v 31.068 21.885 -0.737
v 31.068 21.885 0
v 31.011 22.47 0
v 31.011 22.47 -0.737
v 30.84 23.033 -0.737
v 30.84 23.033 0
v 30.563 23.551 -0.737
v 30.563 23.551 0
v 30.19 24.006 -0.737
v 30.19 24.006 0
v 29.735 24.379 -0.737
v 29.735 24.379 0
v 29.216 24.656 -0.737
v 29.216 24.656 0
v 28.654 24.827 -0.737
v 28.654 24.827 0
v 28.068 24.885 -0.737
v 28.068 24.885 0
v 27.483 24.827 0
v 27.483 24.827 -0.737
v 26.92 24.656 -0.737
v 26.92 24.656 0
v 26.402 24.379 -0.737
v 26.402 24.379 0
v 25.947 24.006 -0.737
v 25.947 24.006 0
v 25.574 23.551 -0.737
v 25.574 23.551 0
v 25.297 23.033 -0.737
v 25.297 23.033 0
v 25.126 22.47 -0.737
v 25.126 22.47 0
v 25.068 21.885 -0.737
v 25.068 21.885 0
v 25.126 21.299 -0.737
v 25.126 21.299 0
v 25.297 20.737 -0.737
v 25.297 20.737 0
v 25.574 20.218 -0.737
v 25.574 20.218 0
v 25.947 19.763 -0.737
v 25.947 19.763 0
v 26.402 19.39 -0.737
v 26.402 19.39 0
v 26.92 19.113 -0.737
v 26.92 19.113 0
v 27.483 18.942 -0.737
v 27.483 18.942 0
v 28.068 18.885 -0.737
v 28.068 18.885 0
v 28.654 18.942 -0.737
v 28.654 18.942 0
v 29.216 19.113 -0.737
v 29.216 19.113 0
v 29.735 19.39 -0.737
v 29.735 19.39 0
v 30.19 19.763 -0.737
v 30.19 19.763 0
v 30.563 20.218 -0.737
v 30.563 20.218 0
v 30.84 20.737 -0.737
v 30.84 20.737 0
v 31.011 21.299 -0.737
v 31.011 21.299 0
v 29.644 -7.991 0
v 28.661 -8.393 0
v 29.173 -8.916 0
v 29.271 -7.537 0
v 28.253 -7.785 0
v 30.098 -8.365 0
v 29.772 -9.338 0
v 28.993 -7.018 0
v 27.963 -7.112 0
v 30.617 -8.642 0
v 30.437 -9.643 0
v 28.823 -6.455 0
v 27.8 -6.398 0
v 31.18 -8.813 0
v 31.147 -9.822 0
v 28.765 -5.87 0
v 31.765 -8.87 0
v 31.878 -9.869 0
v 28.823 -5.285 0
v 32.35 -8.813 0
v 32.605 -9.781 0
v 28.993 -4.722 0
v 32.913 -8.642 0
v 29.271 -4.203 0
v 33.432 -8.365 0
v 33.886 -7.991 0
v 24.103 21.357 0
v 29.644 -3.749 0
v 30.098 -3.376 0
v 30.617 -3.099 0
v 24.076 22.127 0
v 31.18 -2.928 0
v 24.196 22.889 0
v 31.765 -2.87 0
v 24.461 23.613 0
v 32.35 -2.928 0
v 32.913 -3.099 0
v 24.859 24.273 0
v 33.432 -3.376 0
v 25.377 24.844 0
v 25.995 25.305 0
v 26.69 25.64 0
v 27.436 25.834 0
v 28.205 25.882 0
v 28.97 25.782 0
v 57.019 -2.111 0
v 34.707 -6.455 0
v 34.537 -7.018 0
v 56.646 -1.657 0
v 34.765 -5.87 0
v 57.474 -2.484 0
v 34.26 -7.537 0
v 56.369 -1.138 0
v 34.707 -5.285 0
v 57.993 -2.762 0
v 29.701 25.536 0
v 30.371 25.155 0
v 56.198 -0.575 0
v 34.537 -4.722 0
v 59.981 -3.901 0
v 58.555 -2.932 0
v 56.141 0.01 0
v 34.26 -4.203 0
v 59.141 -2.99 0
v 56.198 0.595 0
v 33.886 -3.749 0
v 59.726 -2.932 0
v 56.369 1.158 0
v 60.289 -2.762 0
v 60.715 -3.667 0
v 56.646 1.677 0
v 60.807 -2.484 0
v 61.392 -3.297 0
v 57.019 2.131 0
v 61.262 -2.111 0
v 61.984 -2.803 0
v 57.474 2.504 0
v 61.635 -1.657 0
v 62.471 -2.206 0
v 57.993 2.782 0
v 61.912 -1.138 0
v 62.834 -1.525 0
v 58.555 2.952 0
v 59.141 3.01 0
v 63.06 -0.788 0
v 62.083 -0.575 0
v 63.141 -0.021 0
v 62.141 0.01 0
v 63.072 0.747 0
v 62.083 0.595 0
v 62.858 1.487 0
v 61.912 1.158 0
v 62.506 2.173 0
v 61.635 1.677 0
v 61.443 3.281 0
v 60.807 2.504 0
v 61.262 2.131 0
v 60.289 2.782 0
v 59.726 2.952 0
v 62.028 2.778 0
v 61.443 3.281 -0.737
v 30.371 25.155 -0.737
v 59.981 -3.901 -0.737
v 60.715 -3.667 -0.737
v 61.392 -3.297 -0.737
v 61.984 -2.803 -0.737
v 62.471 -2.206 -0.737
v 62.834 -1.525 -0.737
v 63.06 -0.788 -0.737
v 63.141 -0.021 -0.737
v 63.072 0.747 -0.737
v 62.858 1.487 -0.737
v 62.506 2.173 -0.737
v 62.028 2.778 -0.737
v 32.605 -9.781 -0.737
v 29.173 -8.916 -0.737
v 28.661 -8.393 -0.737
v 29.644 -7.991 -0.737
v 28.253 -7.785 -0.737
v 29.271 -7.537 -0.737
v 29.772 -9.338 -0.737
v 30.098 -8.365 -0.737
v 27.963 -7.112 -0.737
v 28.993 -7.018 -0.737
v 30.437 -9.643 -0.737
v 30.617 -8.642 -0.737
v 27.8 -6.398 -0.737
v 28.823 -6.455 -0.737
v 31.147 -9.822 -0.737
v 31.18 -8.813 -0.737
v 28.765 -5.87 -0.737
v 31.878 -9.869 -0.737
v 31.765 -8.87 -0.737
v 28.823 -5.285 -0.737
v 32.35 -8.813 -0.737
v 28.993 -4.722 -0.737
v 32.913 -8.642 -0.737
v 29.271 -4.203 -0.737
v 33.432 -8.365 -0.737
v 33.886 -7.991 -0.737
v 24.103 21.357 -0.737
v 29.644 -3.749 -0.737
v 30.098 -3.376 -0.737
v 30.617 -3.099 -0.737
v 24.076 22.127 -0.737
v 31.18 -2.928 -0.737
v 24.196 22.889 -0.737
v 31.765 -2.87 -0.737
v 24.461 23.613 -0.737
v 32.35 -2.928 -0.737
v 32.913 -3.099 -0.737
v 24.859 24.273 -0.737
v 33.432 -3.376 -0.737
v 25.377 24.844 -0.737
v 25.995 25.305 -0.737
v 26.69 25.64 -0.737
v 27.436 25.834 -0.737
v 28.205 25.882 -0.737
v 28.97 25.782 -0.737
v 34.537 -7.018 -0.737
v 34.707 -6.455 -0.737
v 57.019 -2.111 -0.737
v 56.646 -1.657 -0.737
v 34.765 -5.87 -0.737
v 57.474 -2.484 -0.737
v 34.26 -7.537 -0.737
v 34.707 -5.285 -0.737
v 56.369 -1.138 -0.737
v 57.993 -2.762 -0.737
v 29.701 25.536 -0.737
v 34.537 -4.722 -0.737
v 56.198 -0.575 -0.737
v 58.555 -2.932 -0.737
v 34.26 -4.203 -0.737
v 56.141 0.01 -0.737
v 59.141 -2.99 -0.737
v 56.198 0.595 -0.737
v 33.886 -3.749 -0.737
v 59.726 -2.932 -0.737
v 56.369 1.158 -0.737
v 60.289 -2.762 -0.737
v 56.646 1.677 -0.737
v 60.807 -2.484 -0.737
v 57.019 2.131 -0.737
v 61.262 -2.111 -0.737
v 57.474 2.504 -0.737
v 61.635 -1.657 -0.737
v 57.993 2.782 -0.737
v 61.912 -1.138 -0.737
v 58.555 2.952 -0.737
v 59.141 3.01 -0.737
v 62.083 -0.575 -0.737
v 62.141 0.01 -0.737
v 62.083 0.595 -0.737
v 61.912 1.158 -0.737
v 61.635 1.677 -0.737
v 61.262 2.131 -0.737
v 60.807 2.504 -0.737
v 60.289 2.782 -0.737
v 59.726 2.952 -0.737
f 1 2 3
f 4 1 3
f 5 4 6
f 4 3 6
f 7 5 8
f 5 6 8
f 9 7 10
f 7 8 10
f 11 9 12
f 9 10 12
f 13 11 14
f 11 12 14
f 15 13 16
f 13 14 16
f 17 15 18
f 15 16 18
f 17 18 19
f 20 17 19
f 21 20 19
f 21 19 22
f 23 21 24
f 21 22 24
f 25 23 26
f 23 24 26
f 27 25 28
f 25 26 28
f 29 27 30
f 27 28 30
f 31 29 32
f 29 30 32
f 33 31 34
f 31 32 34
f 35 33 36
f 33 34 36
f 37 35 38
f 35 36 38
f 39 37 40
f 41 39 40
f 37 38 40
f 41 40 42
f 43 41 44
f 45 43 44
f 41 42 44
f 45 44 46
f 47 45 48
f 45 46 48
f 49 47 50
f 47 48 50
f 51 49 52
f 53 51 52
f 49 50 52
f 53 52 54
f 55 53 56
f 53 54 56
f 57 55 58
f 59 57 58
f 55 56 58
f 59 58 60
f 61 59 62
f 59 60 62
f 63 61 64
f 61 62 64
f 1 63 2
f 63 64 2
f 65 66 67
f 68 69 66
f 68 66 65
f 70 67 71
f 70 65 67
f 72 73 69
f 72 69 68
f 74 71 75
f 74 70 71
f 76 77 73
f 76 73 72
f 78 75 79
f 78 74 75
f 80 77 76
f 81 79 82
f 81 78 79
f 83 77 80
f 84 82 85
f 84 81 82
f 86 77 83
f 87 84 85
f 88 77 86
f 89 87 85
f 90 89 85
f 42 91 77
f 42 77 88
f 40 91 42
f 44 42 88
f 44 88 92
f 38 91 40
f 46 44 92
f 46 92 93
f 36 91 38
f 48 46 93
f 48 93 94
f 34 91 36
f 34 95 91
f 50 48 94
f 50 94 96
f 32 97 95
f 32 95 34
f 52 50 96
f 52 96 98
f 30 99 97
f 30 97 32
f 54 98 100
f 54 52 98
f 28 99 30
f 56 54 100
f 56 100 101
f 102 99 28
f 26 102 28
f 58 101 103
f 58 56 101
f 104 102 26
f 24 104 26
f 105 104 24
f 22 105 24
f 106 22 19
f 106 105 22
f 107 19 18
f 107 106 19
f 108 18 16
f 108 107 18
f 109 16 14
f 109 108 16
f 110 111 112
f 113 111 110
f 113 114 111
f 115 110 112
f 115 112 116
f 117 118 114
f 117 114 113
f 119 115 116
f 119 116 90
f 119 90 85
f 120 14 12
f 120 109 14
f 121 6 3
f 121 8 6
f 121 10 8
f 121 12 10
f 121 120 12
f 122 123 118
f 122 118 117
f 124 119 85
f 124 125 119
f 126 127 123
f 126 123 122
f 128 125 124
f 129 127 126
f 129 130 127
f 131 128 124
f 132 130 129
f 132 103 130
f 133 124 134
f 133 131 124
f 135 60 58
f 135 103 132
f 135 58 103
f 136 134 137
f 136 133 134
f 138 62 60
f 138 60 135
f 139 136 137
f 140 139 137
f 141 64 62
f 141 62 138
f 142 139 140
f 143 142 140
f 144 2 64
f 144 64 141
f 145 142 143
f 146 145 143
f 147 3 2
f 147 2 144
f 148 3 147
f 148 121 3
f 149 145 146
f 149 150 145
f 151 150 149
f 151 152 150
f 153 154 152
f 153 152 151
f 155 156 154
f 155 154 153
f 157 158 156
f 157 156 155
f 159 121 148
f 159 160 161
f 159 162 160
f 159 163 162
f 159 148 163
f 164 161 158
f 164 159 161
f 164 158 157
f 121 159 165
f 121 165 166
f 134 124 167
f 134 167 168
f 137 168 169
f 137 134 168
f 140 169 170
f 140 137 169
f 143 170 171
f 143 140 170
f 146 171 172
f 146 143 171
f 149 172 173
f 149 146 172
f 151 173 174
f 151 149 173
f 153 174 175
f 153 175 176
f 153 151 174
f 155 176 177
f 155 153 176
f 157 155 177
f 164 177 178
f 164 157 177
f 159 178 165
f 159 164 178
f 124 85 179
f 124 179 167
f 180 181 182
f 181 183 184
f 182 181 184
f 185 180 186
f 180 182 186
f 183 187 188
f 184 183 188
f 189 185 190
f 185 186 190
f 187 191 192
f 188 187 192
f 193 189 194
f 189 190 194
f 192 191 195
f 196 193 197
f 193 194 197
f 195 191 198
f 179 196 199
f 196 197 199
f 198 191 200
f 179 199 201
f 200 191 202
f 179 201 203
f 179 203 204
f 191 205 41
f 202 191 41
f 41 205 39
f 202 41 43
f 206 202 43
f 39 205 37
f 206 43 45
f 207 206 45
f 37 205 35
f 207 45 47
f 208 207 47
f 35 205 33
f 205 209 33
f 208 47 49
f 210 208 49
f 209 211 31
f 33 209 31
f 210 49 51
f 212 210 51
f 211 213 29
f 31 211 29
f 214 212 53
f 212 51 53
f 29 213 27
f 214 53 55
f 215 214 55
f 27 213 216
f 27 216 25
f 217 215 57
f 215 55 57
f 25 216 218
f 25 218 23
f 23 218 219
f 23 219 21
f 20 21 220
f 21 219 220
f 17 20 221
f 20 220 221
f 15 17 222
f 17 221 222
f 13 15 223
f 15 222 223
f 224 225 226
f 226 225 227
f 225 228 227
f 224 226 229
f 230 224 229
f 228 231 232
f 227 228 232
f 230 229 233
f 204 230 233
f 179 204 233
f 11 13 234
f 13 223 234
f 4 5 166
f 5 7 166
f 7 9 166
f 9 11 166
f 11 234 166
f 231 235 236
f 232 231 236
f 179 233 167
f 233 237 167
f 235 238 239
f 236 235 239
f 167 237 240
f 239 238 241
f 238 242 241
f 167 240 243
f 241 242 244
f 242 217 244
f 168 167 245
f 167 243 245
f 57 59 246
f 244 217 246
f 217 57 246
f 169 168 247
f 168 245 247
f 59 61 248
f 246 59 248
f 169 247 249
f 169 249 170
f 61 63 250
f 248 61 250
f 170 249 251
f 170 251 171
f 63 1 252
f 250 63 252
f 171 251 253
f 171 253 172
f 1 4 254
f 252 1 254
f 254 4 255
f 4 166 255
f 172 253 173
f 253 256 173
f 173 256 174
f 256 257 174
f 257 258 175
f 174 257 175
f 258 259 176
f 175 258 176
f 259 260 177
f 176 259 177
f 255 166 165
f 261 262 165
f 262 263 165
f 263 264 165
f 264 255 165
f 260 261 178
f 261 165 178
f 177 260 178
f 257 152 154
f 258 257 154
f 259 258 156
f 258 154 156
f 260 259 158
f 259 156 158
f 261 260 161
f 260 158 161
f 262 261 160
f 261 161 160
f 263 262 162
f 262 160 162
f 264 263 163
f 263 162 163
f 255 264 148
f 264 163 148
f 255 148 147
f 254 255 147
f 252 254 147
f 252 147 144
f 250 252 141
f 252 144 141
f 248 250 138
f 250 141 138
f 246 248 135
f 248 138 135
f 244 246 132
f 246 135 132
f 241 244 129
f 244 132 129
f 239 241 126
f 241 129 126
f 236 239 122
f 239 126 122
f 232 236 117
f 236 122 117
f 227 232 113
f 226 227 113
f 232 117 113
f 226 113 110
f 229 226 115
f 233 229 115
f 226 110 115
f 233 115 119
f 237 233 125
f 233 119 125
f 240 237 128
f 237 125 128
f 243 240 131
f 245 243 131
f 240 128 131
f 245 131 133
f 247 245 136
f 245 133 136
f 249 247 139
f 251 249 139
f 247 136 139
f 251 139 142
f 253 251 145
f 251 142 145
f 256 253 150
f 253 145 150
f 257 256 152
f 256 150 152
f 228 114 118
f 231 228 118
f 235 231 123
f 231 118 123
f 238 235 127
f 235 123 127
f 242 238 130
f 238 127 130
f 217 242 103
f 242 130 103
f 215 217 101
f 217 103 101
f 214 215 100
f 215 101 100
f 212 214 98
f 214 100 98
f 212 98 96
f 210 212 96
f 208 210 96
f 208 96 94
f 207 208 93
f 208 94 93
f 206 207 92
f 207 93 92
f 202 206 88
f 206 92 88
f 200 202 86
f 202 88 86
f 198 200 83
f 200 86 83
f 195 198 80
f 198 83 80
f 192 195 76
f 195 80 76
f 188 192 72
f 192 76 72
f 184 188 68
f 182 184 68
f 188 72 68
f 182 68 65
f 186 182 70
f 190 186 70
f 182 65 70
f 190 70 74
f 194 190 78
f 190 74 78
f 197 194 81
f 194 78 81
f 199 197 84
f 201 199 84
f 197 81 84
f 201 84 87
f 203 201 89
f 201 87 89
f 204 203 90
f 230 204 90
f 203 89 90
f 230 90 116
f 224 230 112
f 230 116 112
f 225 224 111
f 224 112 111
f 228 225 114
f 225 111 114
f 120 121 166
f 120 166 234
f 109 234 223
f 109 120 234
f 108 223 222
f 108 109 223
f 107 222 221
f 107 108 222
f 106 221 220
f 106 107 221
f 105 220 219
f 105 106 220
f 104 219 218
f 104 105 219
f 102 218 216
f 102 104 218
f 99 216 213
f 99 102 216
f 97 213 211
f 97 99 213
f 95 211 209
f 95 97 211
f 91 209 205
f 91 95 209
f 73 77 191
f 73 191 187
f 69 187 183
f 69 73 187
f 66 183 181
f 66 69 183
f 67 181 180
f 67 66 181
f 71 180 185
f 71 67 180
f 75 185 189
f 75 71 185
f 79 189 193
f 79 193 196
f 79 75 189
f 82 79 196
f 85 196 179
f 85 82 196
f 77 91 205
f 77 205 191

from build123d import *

# Parameters (mm, degrees)
ESQUISSE1_R               = 3
T_LE_DE_BASE_PLI_E1_DEPTH = 0.7366


# Sheet-metal steps are written as plain solids
with BuildPart() as part:
    # Esquisse1 → Tôle de base pliée1 (new body)
    with BuildSketch(Plane.XY):
        with BuildLine():
            Line((32.6051263, -9.780978848), (59.980728888, -3.900810235))
            ThreePointArc((59.980728888, -3.900810235), (63.060247102, -0.788250523), (61.443305942, 3.280774136))
            Line((61.443305942, 3.280774136), (30.370857933, 25.155484984))
            ThreePointArc((30.370857933, 25.155484984), (25.994902612, 25.305403023), (24.103274011, 21.356580209))
            Line((24.103274011, 21.356580209), (27.800119432, -6.398299253))
            ThreePointArc((27.800119432, -6.398299253), (29.46250107, -9.14096248), (32.6051263, -9.780978848))
        make_face()
        with Locations((28.068256791, 21.884700983)):
            Circle(ESQUISSE1_R, mode=Mode.SUBTRACT)
        with Locations((31.765102212, -5.870178479)):
            Circle(ESQUISSE1_R, mode=Mode.SUBTRACT)
        with Locations((59.1407048, 0.009990135)):
            Circle(ESQUISSE1_R, mode=Mode.SUBTRACT)
    extrude(amount=-T_LE_DE_BASE_PLI_E1_DEPTH)


solid = part.part
